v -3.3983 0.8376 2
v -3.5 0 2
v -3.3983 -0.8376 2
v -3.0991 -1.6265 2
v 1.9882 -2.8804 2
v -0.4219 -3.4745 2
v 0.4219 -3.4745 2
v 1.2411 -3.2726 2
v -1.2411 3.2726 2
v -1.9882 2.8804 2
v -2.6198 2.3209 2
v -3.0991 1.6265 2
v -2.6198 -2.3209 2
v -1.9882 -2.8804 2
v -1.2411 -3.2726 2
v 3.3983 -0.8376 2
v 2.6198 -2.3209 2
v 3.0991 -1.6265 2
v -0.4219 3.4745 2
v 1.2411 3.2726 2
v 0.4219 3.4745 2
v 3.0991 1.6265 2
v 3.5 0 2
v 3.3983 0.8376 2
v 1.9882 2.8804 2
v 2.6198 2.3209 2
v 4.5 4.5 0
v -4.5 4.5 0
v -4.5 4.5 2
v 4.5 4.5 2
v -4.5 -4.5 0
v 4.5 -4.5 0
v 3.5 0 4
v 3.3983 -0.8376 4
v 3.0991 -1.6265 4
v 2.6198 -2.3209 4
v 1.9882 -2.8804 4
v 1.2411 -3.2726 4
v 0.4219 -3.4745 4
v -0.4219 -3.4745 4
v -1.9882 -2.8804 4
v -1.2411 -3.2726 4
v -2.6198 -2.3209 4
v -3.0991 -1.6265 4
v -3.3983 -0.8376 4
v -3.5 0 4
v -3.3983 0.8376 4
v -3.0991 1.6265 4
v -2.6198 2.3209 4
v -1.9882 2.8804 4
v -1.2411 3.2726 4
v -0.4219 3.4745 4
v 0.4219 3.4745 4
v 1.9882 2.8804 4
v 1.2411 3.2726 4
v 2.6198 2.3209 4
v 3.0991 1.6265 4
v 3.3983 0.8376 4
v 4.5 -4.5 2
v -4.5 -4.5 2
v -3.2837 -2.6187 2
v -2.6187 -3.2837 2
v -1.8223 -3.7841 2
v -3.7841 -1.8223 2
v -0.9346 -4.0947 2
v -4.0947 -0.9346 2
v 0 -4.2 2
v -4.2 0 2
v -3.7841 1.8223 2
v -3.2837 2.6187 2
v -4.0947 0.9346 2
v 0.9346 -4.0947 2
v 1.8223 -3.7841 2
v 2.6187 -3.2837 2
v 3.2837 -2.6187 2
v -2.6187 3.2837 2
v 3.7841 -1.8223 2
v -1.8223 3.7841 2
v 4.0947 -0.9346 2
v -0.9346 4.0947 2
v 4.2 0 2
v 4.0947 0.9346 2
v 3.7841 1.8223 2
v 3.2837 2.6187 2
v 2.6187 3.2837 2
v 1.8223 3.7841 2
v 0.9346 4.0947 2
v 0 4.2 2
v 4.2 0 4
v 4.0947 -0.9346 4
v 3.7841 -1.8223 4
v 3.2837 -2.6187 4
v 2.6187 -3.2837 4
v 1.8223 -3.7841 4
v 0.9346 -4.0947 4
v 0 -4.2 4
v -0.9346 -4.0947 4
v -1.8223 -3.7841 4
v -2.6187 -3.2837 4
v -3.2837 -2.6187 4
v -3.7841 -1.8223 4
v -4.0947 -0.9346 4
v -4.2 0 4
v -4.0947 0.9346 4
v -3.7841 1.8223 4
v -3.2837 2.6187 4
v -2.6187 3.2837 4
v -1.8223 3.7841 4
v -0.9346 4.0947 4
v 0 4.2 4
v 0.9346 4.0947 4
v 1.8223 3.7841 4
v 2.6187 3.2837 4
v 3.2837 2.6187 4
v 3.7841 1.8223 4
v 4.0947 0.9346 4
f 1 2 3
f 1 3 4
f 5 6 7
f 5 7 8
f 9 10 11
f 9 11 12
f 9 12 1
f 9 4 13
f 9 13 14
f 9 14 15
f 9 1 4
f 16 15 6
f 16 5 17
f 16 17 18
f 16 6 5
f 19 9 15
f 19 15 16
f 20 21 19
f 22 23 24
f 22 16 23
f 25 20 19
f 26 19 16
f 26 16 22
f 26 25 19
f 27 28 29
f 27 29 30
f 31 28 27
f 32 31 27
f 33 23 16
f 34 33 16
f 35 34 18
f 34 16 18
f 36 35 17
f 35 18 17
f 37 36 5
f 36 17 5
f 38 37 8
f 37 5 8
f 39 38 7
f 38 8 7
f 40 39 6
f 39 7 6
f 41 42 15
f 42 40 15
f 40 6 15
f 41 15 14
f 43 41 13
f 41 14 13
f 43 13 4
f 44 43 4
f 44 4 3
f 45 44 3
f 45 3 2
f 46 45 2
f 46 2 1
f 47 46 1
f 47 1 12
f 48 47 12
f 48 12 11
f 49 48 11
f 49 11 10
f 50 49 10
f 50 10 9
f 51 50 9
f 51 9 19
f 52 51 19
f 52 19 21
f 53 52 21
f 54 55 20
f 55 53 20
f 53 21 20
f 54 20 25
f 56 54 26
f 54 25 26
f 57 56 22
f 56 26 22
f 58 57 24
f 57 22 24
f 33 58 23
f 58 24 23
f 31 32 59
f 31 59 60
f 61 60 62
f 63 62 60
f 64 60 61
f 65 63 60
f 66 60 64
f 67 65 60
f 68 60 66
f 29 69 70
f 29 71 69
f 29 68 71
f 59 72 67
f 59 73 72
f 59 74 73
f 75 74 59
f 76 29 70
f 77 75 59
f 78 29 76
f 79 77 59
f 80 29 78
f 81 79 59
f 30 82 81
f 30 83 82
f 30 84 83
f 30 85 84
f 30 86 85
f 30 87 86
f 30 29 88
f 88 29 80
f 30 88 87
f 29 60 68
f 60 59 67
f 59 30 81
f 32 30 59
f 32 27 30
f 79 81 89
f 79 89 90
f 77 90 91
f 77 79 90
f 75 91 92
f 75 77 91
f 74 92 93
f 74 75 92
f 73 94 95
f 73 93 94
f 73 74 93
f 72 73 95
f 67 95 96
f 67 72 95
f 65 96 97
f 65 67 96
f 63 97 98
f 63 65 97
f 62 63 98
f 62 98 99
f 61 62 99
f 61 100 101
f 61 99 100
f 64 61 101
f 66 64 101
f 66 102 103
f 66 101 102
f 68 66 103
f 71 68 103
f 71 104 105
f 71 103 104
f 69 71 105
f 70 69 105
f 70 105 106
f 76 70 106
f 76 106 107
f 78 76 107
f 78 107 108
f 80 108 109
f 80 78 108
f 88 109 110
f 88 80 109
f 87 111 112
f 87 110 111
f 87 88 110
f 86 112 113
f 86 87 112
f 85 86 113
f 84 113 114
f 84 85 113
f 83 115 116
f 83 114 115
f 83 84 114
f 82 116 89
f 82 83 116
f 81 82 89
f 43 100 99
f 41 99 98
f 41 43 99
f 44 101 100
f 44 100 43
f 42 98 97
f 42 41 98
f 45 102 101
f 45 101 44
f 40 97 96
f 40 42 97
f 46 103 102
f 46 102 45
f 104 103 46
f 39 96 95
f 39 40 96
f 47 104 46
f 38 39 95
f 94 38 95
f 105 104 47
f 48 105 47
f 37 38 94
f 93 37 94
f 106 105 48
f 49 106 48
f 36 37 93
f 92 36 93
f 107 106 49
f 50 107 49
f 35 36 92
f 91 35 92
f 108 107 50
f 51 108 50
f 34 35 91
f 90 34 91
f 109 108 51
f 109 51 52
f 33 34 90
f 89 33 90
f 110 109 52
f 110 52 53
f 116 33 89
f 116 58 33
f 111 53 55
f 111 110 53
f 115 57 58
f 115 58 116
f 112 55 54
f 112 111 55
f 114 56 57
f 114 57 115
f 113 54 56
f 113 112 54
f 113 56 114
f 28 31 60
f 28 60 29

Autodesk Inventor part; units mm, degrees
ref_plane "YZ Plane" through (0, 0, 0) normal (1, 0, 0) x (0, 1, 0)
ref_plane "XZ Plane" through (0, 0, 0) normal (0, 1, 0) x (-1, 0, 0)
ref_plane "XY Plane" through (0, 0, 0) normal (0, 0, 1) x (1, 0, 0)
sketch "Sketch1" plane through (0, 0, 0) normal (0, 0, 1) x (1, 0, 0)
  line L0 (4.5, -4.5) -> (-4.5, -4.5)
  line L1 (-4.5, -4.5) -> (-4.5, 4.5)
  line L2 (-4.5, 4.5) -> (4.5, 4.5)
  line L3 (4.5, 4.5) -> (4.5, -4.5)
  line L4 (4.5, -4.5) -> (-4.5, 4.5) construction
  line L5 (-4.5, -4.5) -> (4.5, 4.5) construction
  point P0 (0, 0)
  dimension "d0" = 9
  dimension "d1" = 9
extrude "Extrusion1" add sketch "Sketch1" along normal blind 2
sketch "Sketch2" plane through (0, 0, 2) normal (0, 0, 1) x (1, 0, 0)
  line L0 (-4.5, -4.5) -> (4.5, -4.5) projected
  line L1 (4.5, -4.5) -> (4.5, 4.5) projected
  line L2 (4.5, 4.5) -> (-4.5, 4.5) projected
  line L3 (-4.5, 4.5) -> (-4.5, -4.5) projected
  circle A0 centre (0, 0) radius 4.2
  circle A1 centre (0, 0) radius 3.5
  dimension "d4" = 8.4
  dimension "d5" = 7
extrude "Extrusion2" add sketch "Sketch2" along normal blind 2 contours A0
properties part number "00_ESP32_Camera_only"
